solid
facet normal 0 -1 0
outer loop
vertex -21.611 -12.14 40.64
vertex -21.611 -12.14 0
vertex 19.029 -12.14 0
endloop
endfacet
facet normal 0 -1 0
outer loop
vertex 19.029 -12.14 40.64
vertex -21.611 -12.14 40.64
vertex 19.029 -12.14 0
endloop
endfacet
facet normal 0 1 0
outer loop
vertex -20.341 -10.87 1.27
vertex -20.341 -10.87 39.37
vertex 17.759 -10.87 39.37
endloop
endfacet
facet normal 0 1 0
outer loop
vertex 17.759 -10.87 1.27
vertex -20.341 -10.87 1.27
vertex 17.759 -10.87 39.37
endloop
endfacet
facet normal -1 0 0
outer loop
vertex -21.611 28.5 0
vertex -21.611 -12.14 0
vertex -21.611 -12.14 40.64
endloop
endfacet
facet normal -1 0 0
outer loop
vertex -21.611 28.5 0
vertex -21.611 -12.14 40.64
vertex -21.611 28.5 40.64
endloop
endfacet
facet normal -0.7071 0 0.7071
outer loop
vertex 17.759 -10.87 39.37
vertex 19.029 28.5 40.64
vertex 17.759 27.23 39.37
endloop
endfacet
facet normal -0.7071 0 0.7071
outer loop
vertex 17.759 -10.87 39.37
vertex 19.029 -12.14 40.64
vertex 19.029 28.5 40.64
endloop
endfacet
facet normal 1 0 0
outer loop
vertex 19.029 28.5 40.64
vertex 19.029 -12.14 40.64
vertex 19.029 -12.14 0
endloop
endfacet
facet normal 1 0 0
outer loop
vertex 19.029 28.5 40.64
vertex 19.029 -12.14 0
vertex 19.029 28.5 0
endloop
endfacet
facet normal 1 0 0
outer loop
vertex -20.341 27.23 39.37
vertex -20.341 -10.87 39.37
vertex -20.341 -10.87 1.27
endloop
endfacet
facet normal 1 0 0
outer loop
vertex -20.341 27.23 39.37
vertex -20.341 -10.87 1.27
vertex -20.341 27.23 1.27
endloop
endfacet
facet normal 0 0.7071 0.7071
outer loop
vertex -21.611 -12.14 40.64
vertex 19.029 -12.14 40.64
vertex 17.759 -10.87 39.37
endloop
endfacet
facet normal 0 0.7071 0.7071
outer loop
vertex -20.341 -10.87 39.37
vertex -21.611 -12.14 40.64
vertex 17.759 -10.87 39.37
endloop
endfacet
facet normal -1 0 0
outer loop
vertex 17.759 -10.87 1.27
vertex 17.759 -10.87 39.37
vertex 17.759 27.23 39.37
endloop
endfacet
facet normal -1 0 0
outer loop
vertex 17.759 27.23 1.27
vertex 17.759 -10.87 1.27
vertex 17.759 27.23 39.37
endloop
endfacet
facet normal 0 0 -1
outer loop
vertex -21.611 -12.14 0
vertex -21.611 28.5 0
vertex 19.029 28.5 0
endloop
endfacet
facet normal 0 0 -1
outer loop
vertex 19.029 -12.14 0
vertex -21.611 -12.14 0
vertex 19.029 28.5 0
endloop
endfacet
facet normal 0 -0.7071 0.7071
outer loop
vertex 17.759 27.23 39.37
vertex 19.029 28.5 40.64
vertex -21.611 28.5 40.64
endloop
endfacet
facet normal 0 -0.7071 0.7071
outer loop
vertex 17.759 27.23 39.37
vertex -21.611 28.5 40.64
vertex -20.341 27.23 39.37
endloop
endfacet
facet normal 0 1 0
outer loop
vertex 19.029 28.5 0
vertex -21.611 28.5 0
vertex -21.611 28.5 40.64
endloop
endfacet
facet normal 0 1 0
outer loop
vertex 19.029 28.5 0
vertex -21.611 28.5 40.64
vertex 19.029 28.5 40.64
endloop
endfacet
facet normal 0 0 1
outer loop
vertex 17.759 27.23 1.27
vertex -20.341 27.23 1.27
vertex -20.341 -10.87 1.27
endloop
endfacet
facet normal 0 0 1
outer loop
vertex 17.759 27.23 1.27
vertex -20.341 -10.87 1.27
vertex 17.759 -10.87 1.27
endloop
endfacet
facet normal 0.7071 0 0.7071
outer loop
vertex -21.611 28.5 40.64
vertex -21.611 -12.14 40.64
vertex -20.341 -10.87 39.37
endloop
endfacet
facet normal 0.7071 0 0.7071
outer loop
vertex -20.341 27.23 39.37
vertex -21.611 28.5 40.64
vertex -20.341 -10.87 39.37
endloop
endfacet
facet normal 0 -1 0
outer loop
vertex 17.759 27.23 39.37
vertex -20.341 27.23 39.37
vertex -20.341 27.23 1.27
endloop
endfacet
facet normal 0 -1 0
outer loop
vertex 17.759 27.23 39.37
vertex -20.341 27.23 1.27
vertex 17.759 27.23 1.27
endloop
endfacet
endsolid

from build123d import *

# Parameters (mm, degrees)
F0_W         = 40.64
F0_H         = 40.64
F1_DEPTH     = 44.45
F2_T         = -1.27
F3_T1_DEPTH  = 38.1
F3_T3_DEPTH  = 38.1
F3_T9_DEPTH  = 51.1641495789
F3_T15_DEPTH = 51.1641495789
F3_T24_DEPTH = 51.1641495789
F3_T30_DEPTH = 51.1641495789
F3_T39_DEPTH = 51.1641495789
F3_T45_DEPTH = 51.1641495789
F3_T54_DEPTH = 51.1641495789
F3_T60_DEPTH = 51.1641495789


# Not quite as in the source:
# - a fillet or chamfer that OpenCascade refuses, or shapes differently, is made with other operations: its cross-section is extruded or revolved along the edge and cut away or added


with BuildPart() as f1:
    # F0 (on Top) → F1 (new body)
    with BuildSketch(Plane.XY):
        with Locations((-1.2905509211, 8.1801498235)):
            Rectangle(F0_W, F0_H)
    extrude(amount=F1_DEPTH)

    # F2
    f2_openings = [f1.faces().sort_by_distance(p)[0] for p in [
        (-1.290551, 8.18015, 44.45),
    ]]
    offset(amount=F2_T, openings=f2_openings)

    # F3: chamfer of 5.08 on 4 edges, made by hand

    # F3_s2 → F3_t1 (cut)
    with BuildSketch(Plane.XZ.offset(-27.2301498235)):
        Polygon((-25.4205509211, 44.45), (-20.3405509211, 39.37), (-20.3405509211, 44.45), align=None)
        Polygon((22.8394490789, 44.45), (17.7594490789, 39.37), (17.7594490789, 44.45), align=None)
    extrude(amount=F3_T1_DEPTH, mode=Mode.SUBTRACT)

    # F3_s4 → F3_t3 (cut)
    with BuildSketch(Plane.YZ.offset(-20.3405509211)):
        Polygon((32.3101498235, 44.45), (27.2301498235, 39.37), (27.2301498235, 44.45), align=None)
        Polygon((-15.9498501765, 44.45), (-10.8698501765, 39.37), (-10.8698501765, 44.45), align=None)
    extrude(amount=F3_T3_DEPTH, mode=Mode.SUBTRACT)


with BuildPart() as f3_tool7:
    # F3_s8 → F3_t9 (new body)
    with BuildSketch(Plane.YZ.offset(17.7594490789)):
        Polygon((32.3101498235, 44.45), (27.2301498235, 39.37), (27.2301498235, 44.45), align=None)
    extrude(amount=-F3_T9_DEPTH)

    split(bisect_by=Plane.XZ.offset(-28.5001498235), keep=Keep.TOP)

    split(bisect_by=Plane.YZ.offset(-21.6105509211), keep=Keep.TOP)

    split(bisect_by=Plane.YZ.offset(-20.3405509211), keep=Keep.BOTTOM)


with BuildPart() as f3_tool13:
    # F3_s14 → F3_t15 (new body)
    with BuildSketch(Plane.XZ.offset(-40.2942994024)):
        Polygon((-25.4205509211, 44.45), (-20.3405509211, 39.37), (-20.3405509211, 44.45), align=None)
    extrude(amount=F3_T15_DEPTH)

    split(bisect_by=Plane.XZ.offset(-28.5001498235), keep=Keep.TOP)

    split(bisect_by=Plane.YZ.offset(-21.6105509211), keep=Keep.TOP)

    split(bisect_by=Plane.XZ.offset(-27.2301498235), keep=Keep.BOTTOM)


with BuildPart() as f3_tool7_1:
    add(f3_tool7.part)

    # F3_t19: intersect F3_tool13
    add(f3_tool13.part, mode=Mode.INTERSECT)


with BuildPart() as f1_1:
    add(f1.part)

    # F3_t5: cut F3_tool7
    add(f3_tool7_1.part, mode=Mode.SUBTRACT)


with BuildPart() as f3_tool22:
    # F3_s23 → F3_t24 (new body)
    with BuildSketch(Plane.YZ.offset(-33.4047005)):
        Polygon((-15.9498501765, 44.45), (-10.8698501765, 39.37), (-10.8698501765, 44.45), align=None)
    extrude(amount=F3_T24_DEPTH)

    split(bisect_by=Plane.YZ.offset(-21.6105509211), keep=Keep.TOP)

    split(bisect_by=Plane.XZ.offset(12.1398501765), keep=Keep.BOTTOM)

    split(bisect_by=Plane.YZ.offset(-20.3405509211), keep=Keep.BOTTOM)


with BuildPart() as f3_tool28:
    # F3_s29 → F3_t30 (new body)
    with BuildSketch(Plane.XZ.offset(-27.2301498235)):
        Polygon((-25.4205509211, 44.45), (-20.3405509211, 39.37), (-20.3405509211, 44.45), align=None)
    extrude(amount=F3_T30_DEPTH)

    split(bisect_by=Plane.YZ.offset(-21.6105509211), keep=Keep.TOP)

    split(bisect_by=Plane.XZ.offset(12.1398501765), keep=Keep.BOTTOM)

    split(bisect_by=Plane.XZ.offset(10.8698501765), keep=Keep.TOP)


with BuildPart() as f3_tool22_1:
    add(f3_tool22.part)

    # F3_t34: intersect F3_tool28
    add(f3_tool28.part, mode=Mode.INTERSECT)


with BuildPart() as f1_2:
    add(f1_1.part)

    # F3_t20: cut F3_tool22
    add(f3_tool22_1.part, mode=Mode.SUBTRACT)


with BuildPart() as f3_tool37:
    # F3_s38 → F3_t39 (new body)
    with BuildSketch(Plane.YZ.offset(30.8235986578)):
        Polygon((32.3101498235, 44.45), (27.2301498235, 39.37), (27.2301498235, 44.45), align=None)
    extrude(amount=-F3_T39_DEPTH)

    split(bisect_by=Plane.XZ.offset(-28.5001498235), keep=Keep.TOP)

    split(bisect_by=Plane.YZ.offset(19.0294490789), keep=Keep.BOTTOM)

    split(bisect_by=Plane.YZ.offset(17.7594490789), keep=Keep.TOP)


with BuildPart() as f3_tool43:
    # F3_s44 → F3_t45 (new body)
    with BuildSketch(Plane.XZ.offset(10.8698501765)):
        Polygon((22.8394490789, 44.45), (17.7594490789, 39.37), (17.7594490789, 44.45), align=None)
    extrude(amount=-F3_T45_DEPTH)

    split(bisect_by=Plane.XZ.offset(-28.5001498235), keep=Keep.TOP)

    split(bisect_by=Plane.YZ.offset(19.0294490789), keep=Keep.BOTTOM)

    split(bisect_by=Plane.XZ.offset(-27.2301498235), keep=Keep.BOTTOM)


with BuildPart() as f3_tool37_1:
    add(f3_tool37.part)

    # F3_t49: intersect F3_tool43
    add(f3_tool43.part, mode=Mode.INTERSECT)


with BuildPart() as f1_3:
    add(f1_2.part)

    # F3_t35: cut F3_tool37
    add(f3_tool37_1.part, mode=Mode.SUBTRACT)


with BuildPart() as f3_tool52:
    # F3_s53 → F3_t54 (new body)
    with BuildSketch(Plane.XZ.offset(23.9339997554)):
        Polygon((22.8394490789, 44.45), (17.7594490789, 39.37), (17.7594490789, 44.45), align=None)
    extrude(amount=-F3_T54_DEPTH)

    split(bisect_by=Plane.XZ.offset(12.1398501765), keep=Keep.BOTTOM)

    split(bisect_by=Plane.YZ.offset(19.0294490789), keep=Keep.BOTTOM)

    split(bisect_by=Plane.XZ.offset(10.8698501765), keep=Keep.TOP)


with BuildPart() as f3_tool58:
    # F3_s59 → F3_t60 (new body)
    with BuildSketch(Plane.YZ.offset(-20.3405509211)):
        Polygon((-15.9498501765, 44.45), (-10.8698501765, 39.37), (-10.8698501765, 44.45), align=None)
    extrude(amount=F3_T60_DEPTH)

    split(bisect_by=Plane.XZ.offset(12.1398501765), keep=Keep.BOTTOM)

    split(bisect_by=Plane.YZ.offset(19.0294490789), keep=Keep.BOTTOM)

    split(bisect_by=Plane.YZ.offset(17.7594490789), keep=Keep.TOP)


with BuildPart() as f3_tool52_1:
    add(f3_tool52.part)

    # F3_t64: intersect F3_tool58
    add(f3_tool58.part, mode=Mode.INTERSECT)


with BuildPart() as f1_4:
    add(f1_3.part)

    # F3_t50: cut F3_tool52
    add(f3_tool52_1.part, mode=Mode.SUBTRACT)


solid = f1_4.part
